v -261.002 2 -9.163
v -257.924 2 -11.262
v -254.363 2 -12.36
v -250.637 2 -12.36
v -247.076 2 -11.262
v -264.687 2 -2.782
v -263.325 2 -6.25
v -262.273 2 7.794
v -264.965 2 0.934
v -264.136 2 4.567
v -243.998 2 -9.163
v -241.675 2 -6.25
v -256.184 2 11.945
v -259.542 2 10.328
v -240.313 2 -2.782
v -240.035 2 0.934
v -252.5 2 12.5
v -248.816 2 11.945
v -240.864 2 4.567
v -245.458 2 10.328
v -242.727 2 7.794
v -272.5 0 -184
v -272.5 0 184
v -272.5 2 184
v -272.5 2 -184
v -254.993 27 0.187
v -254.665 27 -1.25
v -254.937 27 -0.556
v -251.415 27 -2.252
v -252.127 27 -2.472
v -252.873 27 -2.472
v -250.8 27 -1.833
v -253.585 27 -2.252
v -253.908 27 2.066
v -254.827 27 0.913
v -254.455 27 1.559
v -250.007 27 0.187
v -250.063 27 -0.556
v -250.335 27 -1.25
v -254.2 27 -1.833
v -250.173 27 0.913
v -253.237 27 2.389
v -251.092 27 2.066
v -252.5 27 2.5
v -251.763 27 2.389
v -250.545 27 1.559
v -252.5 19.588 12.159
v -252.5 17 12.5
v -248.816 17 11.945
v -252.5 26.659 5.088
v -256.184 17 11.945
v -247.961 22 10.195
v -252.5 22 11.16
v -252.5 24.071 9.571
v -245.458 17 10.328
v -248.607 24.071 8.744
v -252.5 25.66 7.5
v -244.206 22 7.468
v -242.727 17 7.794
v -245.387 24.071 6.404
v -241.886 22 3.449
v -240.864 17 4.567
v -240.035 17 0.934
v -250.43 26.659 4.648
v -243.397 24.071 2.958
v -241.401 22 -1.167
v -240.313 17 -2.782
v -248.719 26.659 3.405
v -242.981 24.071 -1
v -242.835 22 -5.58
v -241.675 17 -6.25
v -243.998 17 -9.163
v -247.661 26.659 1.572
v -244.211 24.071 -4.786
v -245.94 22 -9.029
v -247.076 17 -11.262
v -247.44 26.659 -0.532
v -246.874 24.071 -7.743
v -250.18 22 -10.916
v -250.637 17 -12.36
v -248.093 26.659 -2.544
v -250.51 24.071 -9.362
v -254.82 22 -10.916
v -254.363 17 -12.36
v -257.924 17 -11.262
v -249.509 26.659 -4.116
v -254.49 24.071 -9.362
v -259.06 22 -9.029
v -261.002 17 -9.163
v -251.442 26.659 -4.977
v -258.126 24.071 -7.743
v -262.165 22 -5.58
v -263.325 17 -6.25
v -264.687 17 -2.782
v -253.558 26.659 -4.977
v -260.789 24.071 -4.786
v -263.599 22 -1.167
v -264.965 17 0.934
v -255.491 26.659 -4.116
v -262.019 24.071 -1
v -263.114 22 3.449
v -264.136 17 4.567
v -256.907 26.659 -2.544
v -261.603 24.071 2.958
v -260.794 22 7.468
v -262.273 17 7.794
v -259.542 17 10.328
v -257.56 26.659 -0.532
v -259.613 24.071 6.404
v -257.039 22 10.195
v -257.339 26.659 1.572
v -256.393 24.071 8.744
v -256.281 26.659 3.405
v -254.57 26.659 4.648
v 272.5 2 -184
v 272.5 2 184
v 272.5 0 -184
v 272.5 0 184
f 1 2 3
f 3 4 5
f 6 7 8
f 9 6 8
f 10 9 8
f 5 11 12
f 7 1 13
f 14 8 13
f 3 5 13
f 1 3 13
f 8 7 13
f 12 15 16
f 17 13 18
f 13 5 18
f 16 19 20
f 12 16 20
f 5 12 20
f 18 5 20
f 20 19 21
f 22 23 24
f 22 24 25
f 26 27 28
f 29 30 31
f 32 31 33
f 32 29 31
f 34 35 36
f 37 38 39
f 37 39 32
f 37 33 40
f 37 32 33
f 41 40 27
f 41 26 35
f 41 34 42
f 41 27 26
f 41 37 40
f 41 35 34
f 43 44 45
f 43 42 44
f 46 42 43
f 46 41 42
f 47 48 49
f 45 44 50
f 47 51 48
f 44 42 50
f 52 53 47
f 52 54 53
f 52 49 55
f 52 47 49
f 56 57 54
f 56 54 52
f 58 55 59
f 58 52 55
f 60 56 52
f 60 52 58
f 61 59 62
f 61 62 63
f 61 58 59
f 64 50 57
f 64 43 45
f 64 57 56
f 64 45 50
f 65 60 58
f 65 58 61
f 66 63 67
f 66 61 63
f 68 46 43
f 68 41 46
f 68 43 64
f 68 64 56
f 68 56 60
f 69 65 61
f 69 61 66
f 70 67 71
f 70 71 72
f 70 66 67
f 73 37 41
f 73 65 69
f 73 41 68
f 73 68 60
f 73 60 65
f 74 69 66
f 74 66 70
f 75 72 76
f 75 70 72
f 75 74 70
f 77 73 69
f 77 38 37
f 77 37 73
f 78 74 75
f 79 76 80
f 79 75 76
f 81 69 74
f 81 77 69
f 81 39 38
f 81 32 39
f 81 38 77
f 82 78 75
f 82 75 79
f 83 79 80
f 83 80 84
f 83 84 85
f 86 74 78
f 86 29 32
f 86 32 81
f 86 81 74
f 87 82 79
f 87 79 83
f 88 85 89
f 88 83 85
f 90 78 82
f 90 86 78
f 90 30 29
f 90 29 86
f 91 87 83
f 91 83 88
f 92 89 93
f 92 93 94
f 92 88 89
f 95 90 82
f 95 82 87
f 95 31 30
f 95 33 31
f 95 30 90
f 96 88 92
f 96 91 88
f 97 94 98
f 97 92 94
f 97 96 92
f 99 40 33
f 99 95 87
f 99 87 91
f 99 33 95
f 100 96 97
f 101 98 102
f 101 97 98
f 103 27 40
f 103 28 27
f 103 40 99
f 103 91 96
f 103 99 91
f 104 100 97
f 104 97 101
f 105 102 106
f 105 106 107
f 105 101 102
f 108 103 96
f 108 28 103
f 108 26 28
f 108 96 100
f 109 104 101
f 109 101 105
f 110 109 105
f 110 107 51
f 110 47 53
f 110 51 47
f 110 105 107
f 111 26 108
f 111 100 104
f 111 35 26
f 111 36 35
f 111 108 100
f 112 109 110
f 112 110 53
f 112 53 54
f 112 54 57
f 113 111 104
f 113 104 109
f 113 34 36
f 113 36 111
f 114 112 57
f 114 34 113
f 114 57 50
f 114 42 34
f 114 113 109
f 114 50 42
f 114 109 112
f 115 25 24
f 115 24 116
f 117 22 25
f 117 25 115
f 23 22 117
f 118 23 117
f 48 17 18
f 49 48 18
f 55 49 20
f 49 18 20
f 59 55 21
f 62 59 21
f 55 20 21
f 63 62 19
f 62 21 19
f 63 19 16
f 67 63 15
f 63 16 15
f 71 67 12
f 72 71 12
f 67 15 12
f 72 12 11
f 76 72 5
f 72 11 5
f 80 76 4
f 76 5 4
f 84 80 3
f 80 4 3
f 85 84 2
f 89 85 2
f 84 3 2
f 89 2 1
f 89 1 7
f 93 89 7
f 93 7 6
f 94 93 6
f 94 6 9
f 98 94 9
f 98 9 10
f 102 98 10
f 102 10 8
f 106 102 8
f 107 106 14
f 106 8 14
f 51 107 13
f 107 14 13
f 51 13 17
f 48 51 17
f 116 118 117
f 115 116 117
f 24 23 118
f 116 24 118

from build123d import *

# Parameters (mm, degrees)
CROQUIS1_W     = 545
CROQUIS1_H     = 368
EXTRUIR1_DEPTH = 2
CROQUIS2_R     = 12.5
EXTRUIR2_DEPTH = 25
REDONDEO1_R    = 10


with BuildPart() as part:
    # Croquis1 → Extruir1 (new body)
    with BuildSketch(Plane(origin=(0, 0, 0), x_dir=(1, 0, 0), z_dir=(0, 1, 0))):
        Rectangle(CROQUIS1_W, CROQUIS1_H)
    extrude(amount=EXTRUIR1_DEPTH)


with BuildPart() as body_2:
    # Croquis2 → Extruir2 (new body)
    with BuildSketch(Plane(origin=(0, 2, 0), x_dir=(1, 0, 0), z_dir=(0, 1, 0))):
        with Locations(Location((-252.5, 0, 0), (0, 0, 270))):
            Circle(CROQUIS2_R)
    extrude(amount=EXTRUIR2_DEPTH)

    # Redondeo1
    redondeo1_edges = [body_2.edges().sort_by_distance(p)[0] for p in [
        (-252.5, 27, -12.5),
    ]]
    fillet(redondeo1_edges, radius=REDONDEO1_R)


solid = Compound([part.part, body_2.part])
